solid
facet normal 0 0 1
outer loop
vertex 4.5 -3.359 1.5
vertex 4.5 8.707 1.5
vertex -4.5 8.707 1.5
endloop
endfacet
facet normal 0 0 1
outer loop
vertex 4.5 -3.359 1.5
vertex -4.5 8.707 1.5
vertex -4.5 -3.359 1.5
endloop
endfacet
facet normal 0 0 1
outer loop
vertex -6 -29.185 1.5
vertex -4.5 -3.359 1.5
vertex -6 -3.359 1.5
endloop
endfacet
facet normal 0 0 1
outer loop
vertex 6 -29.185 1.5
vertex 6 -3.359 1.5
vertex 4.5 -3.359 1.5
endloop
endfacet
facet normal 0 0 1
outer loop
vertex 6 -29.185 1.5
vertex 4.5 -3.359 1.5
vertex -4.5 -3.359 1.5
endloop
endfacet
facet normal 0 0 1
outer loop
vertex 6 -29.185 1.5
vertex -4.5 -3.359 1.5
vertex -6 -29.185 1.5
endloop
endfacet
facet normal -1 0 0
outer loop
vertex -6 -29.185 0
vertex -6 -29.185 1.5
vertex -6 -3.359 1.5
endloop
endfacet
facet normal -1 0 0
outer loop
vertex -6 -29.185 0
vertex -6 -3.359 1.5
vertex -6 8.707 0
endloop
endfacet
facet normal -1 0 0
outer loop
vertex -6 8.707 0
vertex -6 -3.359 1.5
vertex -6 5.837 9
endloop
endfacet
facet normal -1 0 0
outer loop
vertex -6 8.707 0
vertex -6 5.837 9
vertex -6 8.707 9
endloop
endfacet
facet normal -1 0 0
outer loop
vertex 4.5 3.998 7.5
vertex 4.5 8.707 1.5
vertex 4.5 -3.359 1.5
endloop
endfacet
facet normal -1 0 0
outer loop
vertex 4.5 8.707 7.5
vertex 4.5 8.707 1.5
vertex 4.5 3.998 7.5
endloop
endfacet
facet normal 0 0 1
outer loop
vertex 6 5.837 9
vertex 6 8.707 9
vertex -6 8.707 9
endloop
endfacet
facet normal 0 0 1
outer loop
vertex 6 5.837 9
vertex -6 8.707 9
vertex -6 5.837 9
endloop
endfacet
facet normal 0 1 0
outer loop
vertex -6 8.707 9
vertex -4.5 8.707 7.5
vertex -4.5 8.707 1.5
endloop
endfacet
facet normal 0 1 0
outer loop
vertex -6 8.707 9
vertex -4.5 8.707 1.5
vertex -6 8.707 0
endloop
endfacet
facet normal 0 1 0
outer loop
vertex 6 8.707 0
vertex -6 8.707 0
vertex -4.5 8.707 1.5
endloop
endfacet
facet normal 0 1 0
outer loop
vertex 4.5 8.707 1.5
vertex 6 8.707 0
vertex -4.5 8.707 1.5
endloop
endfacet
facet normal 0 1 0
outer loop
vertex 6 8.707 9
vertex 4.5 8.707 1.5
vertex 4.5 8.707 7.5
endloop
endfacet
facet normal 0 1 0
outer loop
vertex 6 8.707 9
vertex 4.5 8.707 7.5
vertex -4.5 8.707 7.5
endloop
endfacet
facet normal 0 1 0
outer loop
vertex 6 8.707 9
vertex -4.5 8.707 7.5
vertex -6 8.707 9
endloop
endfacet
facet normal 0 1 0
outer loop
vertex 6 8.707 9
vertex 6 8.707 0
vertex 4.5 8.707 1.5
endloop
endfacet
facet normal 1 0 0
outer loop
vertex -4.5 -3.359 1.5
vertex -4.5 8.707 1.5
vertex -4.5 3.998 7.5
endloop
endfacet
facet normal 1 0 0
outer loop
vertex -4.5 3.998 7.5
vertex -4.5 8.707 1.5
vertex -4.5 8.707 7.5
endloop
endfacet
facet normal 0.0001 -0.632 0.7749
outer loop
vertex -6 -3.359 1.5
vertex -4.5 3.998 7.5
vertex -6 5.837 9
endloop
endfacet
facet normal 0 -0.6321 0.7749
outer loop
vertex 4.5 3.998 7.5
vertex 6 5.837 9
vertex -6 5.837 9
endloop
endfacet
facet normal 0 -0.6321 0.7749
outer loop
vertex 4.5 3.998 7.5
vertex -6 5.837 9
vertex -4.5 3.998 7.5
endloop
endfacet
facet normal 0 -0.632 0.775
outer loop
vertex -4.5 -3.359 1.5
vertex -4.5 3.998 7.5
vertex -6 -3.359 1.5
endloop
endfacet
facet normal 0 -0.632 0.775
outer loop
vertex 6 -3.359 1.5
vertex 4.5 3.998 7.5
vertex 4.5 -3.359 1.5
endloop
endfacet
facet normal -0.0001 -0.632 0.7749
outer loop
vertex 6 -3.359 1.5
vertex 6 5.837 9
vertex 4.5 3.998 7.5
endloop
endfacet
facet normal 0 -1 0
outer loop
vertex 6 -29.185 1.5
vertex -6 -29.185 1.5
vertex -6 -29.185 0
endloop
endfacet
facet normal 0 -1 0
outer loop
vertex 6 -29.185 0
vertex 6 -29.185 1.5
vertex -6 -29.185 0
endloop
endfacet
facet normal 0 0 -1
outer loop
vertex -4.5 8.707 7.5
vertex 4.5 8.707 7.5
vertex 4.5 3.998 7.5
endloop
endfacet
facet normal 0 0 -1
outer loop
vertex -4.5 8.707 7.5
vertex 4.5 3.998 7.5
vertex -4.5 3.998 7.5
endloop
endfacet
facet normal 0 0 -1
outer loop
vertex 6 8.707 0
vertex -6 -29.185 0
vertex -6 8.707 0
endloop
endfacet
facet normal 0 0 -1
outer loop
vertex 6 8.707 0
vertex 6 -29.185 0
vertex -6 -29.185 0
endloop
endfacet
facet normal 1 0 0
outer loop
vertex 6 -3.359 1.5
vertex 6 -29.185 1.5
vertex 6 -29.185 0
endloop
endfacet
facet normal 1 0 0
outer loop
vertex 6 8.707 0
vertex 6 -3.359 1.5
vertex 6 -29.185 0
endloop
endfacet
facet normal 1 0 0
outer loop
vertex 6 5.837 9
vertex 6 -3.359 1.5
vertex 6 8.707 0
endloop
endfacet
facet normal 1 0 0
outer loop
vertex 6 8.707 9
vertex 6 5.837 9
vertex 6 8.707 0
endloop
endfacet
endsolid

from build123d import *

# Parameters (mm, degrees)
F1_DEPTH = 6
F2_W     = 9
F2_H     = 6
F3_DEPTH = 13.0652172513


with BuildPart() as f1:
    # F0 (on Right) → F1 (new body, symmetric)
    with BuildSketch(Plane.YZ):
        Polygon((-29.184781258, 0), (8.7065214151, 0), (8.7065214151, 9), (5.8369566332, 9), (-3.3586958362, 1.5), (-29.184781258, 1.5), align=None)
    extrude(amount=F1_DEPTH, both=True)

    # F2 (on face) → F3 (cut, up to face)
    with BuildSketch(Plane(origin=(0, 8.7065214151, 0), x_dir=(-1, 0, 0), z_dir=(0, 1, 0))):
        with Locations((0, 4.5)):
            Rectangle(F2_W, F2_H)
    extrude(amount=-F3_DEPTH, mode=Mode.SUBTRACT)


solid = f1.part
